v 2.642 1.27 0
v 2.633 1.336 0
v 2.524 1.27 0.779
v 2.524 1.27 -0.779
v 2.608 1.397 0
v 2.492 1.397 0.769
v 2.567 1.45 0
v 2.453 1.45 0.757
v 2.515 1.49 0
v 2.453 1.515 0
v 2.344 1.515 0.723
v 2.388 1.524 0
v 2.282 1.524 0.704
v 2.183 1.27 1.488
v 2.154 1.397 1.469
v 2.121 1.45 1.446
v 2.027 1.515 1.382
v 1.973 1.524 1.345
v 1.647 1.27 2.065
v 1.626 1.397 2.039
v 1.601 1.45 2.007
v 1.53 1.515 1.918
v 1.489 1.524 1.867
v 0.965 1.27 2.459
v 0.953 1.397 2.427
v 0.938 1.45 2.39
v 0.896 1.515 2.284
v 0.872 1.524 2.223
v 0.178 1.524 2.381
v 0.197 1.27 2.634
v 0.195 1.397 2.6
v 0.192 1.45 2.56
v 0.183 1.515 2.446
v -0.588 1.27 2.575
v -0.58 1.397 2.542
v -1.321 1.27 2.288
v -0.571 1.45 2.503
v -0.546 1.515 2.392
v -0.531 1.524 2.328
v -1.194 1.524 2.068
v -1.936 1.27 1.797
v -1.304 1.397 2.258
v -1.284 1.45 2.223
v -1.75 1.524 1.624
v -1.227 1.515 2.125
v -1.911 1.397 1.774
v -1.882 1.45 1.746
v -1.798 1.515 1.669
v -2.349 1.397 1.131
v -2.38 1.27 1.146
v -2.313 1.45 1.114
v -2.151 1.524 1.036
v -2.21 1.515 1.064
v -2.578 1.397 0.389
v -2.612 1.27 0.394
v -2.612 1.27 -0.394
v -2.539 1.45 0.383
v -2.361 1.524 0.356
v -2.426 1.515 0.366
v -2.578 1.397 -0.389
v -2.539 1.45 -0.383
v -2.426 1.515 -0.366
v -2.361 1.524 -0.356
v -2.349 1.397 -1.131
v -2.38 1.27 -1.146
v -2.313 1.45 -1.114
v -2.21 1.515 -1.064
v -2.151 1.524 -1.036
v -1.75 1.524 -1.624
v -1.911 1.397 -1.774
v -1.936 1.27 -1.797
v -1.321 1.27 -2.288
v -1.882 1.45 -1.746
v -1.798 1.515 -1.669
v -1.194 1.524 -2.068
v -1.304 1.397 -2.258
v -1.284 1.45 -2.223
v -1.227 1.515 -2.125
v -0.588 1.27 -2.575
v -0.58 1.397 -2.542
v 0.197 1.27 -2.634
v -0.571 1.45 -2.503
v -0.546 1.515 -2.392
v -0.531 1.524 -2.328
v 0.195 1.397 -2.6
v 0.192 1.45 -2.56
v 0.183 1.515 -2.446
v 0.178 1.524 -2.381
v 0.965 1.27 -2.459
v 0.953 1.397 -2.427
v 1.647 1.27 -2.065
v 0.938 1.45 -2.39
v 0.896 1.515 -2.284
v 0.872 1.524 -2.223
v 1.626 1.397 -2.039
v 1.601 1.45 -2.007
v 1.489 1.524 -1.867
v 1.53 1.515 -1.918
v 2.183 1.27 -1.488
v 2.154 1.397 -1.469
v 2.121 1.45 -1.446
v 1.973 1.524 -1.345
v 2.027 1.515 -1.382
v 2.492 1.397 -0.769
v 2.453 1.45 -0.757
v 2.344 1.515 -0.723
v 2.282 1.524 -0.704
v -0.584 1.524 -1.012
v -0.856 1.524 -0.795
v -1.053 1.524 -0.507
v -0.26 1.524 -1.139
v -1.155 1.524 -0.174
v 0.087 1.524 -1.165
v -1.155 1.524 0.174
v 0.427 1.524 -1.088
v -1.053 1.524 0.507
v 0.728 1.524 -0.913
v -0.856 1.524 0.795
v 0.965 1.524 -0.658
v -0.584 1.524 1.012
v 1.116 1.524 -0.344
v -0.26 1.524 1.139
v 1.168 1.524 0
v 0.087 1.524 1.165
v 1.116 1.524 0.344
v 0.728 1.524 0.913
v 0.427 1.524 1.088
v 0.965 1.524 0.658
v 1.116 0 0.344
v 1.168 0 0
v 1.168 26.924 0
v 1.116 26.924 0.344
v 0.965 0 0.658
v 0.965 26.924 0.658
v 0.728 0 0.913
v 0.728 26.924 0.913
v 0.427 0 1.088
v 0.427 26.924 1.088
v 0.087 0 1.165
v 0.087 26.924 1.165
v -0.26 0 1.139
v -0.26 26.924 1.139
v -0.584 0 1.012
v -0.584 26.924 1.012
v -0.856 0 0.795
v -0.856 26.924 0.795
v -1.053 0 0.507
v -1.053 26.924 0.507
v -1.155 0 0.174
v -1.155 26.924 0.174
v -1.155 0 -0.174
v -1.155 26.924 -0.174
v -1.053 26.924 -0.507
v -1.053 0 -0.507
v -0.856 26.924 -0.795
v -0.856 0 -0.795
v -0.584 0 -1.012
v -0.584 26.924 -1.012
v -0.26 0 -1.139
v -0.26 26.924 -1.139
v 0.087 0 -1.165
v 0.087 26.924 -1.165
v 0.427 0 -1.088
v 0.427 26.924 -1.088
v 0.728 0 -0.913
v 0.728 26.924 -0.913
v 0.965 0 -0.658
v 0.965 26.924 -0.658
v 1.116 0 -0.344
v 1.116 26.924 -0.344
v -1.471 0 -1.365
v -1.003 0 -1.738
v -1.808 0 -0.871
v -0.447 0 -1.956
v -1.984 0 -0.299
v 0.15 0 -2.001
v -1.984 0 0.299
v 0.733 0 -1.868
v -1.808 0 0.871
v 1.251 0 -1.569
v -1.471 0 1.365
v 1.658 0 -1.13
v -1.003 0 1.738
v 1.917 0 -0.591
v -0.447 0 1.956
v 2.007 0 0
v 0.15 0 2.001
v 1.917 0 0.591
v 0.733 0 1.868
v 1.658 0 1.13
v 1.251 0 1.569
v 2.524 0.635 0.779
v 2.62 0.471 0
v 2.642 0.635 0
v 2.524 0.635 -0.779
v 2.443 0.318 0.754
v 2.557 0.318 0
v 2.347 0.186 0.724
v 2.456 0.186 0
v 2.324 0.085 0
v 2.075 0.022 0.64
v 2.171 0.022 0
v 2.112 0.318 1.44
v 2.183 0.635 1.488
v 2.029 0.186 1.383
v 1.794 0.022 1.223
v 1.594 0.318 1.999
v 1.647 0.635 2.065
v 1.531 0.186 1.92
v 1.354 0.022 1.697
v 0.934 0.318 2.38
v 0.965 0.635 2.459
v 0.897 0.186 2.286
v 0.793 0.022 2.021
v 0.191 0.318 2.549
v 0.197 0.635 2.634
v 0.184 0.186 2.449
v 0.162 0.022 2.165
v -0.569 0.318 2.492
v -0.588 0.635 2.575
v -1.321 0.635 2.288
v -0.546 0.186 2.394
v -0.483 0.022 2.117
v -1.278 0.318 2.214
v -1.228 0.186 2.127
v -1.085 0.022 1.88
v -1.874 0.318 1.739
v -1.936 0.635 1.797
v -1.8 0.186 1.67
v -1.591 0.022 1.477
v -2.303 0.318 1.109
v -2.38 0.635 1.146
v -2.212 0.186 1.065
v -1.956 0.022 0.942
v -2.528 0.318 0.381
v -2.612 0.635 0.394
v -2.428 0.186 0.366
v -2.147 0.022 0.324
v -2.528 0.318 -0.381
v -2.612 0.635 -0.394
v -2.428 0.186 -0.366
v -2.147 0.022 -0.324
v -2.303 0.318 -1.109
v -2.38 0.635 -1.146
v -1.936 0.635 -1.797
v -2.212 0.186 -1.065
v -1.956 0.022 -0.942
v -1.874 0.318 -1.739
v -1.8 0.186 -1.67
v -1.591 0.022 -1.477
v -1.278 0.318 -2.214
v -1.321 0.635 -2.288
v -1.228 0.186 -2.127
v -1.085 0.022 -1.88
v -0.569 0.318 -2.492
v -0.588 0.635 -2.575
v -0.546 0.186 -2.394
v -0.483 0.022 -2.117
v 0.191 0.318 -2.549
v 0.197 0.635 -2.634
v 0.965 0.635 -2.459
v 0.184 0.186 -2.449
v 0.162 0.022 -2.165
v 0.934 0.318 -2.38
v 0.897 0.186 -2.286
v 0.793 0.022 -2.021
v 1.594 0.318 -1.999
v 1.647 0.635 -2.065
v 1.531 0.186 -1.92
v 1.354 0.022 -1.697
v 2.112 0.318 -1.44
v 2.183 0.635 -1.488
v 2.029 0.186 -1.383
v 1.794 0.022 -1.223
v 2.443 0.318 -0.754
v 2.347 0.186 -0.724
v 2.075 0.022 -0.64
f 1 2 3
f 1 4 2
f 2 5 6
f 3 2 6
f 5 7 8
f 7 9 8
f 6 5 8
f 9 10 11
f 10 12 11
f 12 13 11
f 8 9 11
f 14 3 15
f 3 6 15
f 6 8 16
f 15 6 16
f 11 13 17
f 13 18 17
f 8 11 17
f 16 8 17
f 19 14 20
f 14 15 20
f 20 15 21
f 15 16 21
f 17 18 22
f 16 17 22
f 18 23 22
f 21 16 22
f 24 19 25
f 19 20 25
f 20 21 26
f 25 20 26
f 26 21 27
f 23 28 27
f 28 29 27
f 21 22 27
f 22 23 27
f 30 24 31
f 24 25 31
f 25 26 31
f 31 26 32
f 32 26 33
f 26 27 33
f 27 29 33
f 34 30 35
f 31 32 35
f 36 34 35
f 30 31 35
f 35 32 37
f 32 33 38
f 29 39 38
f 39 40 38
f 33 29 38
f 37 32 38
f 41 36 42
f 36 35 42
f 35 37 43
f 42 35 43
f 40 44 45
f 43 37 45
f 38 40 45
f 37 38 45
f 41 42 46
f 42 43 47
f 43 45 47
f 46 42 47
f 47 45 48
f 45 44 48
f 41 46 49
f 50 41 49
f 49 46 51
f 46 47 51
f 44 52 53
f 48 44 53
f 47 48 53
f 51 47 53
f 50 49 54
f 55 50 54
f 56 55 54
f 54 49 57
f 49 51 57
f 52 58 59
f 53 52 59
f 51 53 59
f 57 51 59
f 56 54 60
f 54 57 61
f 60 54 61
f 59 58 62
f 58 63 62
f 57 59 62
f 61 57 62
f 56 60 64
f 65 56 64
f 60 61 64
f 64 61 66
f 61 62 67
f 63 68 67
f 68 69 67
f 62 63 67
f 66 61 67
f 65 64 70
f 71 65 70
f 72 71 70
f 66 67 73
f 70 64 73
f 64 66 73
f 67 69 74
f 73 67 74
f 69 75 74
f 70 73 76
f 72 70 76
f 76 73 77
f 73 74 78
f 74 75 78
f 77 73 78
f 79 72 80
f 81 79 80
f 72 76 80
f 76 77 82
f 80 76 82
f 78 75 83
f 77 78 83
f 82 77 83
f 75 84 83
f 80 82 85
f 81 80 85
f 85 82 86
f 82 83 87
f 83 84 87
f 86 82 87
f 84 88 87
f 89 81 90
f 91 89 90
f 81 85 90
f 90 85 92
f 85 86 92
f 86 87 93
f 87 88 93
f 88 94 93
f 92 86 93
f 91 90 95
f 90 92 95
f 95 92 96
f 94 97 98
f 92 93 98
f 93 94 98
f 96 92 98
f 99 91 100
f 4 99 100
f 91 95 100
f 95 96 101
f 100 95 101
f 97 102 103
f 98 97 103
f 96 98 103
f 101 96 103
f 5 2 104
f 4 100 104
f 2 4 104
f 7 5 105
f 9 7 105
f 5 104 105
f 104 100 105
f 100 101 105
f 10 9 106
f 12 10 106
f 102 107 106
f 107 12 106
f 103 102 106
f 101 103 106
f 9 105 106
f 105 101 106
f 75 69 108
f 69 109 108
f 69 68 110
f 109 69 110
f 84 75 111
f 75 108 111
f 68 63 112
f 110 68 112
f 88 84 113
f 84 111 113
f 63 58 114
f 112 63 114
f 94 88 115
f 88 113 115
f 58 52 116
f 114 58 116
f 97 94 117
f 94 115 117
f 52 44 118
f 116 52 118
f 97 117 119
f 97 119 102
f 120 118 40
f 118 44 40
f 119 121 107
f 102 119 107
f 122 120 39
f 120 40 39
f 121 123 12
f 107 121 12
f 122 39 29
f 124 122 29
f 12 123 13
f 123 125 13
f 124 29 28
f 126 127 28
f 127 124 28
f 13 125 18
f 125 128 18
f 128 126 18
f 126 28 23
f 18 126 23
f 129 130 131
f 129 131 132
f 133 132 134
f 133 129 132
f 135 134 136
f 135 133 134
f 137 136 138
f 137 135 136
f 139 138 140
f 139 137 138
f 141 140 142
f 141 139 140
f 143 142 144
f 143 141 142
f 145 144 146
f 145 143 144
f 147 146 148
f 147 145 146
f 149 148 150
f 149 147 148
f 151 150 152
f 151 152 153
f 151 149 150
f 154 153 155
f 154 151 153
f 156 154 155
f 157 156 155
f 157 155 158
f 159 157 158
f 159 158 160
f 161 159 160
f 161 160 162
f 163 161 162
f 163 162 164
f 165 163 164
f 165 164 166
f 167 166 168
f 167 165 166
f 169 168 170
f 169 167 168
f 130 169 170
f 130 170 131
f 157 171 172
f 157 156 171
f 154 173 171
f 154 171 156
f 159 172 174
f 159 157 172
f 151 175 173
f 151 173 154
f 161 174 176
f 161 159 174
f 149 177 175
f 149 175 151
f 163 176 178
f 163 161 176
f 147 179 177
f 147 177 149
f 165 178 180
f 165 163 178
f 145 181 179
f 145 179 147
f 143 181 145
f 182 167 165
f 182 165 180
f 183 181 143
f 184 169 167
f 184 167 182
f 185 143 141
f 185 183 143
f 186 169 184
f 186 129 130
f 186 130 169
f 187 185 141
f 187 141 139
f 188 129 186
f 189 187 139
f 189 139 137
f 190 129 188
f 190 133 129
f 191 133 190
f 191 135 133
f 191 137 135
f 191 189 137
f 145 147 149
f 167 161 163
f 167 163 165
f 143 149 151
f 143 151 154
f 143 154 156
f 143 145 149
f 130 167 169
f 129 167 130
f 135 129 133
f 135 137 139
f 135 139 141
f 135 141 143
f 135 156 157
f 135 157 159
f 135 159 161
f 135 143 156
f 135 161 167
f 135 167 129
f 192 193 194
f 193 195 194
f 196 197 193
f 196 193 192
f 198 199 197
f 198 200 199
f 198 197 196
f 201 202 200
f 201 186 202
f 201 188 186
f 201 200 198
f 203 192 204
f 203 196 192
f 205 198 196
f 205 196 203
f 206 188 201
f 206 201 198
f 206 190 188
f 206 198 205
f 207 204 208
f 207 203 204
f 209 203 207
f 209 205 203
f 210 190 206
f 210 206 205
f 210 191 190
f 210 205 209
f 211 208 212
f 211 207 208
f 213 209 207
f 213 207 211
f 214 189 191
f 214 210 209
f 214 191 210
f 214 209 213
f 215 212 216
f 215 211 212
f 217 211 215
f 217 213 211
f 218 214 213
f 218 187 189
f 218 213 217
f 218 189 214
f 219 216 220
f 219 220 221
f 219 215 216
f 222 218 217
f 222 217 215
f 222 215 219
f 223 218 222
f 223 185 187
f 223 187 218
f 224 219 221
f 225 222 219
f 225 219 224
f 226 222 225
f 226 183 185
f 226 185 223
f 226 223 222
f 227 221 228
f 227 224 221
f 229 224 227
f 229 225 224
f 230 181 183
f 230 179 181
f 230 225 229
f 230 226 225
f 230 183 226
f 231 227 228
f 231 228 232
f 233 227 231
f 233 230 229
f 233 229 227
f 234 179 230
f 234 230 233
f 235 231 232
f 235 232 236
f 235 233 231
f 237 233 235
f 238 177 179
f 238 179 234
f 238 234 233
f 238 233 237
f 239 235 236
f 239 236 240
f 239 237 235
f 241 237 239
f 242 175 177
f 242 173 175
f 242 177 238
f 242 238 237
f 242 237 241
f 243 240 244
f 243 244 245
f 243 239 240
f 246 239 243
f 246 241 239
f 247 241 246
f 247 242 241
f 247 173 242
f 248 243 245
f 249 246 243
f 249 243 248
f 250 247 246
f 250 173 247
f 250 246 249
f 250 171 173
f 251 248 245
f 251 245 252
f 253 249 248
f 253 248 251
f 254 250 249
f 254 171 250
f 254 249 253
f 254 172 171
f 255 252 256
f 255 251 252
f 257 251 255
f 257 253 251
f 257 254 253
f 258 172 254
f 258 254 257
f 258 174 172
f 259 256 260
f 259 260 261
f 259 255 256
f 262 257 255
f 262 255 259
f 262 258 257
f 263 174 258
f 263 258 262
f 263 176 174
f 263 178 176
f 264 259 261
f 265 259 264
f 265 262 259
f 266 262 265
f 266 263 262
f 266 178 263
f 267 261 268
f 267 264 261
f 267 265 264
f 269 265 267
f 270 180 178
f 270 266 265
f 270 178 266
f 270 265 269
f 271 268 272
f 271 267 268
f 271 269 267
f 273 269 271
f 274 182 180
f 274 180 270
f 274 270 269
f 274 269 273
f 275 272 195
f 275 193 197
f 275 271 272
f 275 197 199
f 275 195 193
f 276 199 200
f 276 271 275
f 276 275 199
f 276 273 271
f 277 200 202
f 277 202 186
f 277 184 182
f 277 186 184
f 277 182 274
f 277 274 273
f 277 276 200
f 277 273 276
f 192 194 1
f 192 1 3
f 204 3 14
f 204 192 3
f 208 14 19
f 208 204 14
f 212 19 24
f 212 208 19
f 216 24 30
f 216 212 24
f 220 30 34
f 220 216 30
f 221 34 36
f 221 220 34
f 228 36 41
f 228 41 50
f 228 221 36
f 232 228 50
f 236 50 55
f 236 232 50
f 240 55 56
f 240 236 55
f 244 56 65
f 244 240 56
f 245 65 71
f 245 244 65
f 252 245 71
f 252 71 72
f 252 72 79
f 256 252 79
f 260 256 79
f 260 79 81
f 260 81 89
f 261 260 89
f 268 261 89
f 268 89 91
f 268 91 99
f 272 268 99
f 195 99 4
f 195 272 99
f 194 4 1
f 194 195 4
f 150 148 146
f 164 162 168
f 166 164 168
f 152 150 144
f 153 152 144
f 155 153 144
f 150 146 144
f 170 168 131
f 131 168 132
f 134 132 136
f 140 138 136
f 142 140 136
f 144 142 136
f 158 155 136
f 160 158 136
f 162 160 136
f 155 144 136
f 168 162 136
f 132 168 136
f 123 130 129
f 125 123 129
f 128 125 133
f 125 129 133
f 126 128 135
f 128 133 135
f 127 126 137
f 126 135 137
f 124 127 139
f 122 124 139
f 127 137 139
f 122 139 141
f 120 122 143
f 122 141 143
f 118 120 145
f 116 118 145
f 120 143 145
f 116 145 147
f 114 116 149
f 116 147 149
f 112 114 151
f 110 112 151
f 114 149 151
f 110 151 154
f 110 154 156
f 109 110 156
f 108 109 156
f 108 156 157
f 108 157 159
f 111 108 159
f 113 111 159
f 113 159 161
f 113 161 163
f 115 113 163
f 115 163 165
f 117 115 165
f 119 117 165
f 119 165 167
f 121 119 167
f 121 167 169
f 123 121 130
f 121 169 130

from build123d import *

# Parameters (mm, degrees)
F0_R     = 2.6416
F0_R_2   = 1.1684
F1_DEPTH = 1.524
F2_R     = 1.1684
F3_DEPTH = 26.924
F4_R     = 0.635
F5_R     = 0.254


with BuildPart() as f1:
    # F0 (on Front) → F1 (new body)
    with BuildSketch(Plane.XZ):
        Circle(F0_R)
        Circle(F0_R_2, mode=Mode.SUBTRACT)
    extrude(amount=-F1_DEPTH)

    # F4
    f4_edges = [f1.edges().sort_by_distance(p)[0] for p in [
        (-2.6416, 0, 0),
    ]]
    fillet(f4_edges, radius=F4_R)

    # F5
    f5_edges = [f1.edges().sort_by_distance(p)[0] for p in [
        (-2.6416, 1.524, 0),
    ]]
    fillet(f5_edges, radius=F5_R)


with BuildPart() as f3:
    # F2 (on face) → F3 (new body)
    with BuildSketch(Plane.XZ):
        Circle(F2_R)
    extrude(amount=-F3_DEPTH)


solid = Compound([f1.part, f3.part])
